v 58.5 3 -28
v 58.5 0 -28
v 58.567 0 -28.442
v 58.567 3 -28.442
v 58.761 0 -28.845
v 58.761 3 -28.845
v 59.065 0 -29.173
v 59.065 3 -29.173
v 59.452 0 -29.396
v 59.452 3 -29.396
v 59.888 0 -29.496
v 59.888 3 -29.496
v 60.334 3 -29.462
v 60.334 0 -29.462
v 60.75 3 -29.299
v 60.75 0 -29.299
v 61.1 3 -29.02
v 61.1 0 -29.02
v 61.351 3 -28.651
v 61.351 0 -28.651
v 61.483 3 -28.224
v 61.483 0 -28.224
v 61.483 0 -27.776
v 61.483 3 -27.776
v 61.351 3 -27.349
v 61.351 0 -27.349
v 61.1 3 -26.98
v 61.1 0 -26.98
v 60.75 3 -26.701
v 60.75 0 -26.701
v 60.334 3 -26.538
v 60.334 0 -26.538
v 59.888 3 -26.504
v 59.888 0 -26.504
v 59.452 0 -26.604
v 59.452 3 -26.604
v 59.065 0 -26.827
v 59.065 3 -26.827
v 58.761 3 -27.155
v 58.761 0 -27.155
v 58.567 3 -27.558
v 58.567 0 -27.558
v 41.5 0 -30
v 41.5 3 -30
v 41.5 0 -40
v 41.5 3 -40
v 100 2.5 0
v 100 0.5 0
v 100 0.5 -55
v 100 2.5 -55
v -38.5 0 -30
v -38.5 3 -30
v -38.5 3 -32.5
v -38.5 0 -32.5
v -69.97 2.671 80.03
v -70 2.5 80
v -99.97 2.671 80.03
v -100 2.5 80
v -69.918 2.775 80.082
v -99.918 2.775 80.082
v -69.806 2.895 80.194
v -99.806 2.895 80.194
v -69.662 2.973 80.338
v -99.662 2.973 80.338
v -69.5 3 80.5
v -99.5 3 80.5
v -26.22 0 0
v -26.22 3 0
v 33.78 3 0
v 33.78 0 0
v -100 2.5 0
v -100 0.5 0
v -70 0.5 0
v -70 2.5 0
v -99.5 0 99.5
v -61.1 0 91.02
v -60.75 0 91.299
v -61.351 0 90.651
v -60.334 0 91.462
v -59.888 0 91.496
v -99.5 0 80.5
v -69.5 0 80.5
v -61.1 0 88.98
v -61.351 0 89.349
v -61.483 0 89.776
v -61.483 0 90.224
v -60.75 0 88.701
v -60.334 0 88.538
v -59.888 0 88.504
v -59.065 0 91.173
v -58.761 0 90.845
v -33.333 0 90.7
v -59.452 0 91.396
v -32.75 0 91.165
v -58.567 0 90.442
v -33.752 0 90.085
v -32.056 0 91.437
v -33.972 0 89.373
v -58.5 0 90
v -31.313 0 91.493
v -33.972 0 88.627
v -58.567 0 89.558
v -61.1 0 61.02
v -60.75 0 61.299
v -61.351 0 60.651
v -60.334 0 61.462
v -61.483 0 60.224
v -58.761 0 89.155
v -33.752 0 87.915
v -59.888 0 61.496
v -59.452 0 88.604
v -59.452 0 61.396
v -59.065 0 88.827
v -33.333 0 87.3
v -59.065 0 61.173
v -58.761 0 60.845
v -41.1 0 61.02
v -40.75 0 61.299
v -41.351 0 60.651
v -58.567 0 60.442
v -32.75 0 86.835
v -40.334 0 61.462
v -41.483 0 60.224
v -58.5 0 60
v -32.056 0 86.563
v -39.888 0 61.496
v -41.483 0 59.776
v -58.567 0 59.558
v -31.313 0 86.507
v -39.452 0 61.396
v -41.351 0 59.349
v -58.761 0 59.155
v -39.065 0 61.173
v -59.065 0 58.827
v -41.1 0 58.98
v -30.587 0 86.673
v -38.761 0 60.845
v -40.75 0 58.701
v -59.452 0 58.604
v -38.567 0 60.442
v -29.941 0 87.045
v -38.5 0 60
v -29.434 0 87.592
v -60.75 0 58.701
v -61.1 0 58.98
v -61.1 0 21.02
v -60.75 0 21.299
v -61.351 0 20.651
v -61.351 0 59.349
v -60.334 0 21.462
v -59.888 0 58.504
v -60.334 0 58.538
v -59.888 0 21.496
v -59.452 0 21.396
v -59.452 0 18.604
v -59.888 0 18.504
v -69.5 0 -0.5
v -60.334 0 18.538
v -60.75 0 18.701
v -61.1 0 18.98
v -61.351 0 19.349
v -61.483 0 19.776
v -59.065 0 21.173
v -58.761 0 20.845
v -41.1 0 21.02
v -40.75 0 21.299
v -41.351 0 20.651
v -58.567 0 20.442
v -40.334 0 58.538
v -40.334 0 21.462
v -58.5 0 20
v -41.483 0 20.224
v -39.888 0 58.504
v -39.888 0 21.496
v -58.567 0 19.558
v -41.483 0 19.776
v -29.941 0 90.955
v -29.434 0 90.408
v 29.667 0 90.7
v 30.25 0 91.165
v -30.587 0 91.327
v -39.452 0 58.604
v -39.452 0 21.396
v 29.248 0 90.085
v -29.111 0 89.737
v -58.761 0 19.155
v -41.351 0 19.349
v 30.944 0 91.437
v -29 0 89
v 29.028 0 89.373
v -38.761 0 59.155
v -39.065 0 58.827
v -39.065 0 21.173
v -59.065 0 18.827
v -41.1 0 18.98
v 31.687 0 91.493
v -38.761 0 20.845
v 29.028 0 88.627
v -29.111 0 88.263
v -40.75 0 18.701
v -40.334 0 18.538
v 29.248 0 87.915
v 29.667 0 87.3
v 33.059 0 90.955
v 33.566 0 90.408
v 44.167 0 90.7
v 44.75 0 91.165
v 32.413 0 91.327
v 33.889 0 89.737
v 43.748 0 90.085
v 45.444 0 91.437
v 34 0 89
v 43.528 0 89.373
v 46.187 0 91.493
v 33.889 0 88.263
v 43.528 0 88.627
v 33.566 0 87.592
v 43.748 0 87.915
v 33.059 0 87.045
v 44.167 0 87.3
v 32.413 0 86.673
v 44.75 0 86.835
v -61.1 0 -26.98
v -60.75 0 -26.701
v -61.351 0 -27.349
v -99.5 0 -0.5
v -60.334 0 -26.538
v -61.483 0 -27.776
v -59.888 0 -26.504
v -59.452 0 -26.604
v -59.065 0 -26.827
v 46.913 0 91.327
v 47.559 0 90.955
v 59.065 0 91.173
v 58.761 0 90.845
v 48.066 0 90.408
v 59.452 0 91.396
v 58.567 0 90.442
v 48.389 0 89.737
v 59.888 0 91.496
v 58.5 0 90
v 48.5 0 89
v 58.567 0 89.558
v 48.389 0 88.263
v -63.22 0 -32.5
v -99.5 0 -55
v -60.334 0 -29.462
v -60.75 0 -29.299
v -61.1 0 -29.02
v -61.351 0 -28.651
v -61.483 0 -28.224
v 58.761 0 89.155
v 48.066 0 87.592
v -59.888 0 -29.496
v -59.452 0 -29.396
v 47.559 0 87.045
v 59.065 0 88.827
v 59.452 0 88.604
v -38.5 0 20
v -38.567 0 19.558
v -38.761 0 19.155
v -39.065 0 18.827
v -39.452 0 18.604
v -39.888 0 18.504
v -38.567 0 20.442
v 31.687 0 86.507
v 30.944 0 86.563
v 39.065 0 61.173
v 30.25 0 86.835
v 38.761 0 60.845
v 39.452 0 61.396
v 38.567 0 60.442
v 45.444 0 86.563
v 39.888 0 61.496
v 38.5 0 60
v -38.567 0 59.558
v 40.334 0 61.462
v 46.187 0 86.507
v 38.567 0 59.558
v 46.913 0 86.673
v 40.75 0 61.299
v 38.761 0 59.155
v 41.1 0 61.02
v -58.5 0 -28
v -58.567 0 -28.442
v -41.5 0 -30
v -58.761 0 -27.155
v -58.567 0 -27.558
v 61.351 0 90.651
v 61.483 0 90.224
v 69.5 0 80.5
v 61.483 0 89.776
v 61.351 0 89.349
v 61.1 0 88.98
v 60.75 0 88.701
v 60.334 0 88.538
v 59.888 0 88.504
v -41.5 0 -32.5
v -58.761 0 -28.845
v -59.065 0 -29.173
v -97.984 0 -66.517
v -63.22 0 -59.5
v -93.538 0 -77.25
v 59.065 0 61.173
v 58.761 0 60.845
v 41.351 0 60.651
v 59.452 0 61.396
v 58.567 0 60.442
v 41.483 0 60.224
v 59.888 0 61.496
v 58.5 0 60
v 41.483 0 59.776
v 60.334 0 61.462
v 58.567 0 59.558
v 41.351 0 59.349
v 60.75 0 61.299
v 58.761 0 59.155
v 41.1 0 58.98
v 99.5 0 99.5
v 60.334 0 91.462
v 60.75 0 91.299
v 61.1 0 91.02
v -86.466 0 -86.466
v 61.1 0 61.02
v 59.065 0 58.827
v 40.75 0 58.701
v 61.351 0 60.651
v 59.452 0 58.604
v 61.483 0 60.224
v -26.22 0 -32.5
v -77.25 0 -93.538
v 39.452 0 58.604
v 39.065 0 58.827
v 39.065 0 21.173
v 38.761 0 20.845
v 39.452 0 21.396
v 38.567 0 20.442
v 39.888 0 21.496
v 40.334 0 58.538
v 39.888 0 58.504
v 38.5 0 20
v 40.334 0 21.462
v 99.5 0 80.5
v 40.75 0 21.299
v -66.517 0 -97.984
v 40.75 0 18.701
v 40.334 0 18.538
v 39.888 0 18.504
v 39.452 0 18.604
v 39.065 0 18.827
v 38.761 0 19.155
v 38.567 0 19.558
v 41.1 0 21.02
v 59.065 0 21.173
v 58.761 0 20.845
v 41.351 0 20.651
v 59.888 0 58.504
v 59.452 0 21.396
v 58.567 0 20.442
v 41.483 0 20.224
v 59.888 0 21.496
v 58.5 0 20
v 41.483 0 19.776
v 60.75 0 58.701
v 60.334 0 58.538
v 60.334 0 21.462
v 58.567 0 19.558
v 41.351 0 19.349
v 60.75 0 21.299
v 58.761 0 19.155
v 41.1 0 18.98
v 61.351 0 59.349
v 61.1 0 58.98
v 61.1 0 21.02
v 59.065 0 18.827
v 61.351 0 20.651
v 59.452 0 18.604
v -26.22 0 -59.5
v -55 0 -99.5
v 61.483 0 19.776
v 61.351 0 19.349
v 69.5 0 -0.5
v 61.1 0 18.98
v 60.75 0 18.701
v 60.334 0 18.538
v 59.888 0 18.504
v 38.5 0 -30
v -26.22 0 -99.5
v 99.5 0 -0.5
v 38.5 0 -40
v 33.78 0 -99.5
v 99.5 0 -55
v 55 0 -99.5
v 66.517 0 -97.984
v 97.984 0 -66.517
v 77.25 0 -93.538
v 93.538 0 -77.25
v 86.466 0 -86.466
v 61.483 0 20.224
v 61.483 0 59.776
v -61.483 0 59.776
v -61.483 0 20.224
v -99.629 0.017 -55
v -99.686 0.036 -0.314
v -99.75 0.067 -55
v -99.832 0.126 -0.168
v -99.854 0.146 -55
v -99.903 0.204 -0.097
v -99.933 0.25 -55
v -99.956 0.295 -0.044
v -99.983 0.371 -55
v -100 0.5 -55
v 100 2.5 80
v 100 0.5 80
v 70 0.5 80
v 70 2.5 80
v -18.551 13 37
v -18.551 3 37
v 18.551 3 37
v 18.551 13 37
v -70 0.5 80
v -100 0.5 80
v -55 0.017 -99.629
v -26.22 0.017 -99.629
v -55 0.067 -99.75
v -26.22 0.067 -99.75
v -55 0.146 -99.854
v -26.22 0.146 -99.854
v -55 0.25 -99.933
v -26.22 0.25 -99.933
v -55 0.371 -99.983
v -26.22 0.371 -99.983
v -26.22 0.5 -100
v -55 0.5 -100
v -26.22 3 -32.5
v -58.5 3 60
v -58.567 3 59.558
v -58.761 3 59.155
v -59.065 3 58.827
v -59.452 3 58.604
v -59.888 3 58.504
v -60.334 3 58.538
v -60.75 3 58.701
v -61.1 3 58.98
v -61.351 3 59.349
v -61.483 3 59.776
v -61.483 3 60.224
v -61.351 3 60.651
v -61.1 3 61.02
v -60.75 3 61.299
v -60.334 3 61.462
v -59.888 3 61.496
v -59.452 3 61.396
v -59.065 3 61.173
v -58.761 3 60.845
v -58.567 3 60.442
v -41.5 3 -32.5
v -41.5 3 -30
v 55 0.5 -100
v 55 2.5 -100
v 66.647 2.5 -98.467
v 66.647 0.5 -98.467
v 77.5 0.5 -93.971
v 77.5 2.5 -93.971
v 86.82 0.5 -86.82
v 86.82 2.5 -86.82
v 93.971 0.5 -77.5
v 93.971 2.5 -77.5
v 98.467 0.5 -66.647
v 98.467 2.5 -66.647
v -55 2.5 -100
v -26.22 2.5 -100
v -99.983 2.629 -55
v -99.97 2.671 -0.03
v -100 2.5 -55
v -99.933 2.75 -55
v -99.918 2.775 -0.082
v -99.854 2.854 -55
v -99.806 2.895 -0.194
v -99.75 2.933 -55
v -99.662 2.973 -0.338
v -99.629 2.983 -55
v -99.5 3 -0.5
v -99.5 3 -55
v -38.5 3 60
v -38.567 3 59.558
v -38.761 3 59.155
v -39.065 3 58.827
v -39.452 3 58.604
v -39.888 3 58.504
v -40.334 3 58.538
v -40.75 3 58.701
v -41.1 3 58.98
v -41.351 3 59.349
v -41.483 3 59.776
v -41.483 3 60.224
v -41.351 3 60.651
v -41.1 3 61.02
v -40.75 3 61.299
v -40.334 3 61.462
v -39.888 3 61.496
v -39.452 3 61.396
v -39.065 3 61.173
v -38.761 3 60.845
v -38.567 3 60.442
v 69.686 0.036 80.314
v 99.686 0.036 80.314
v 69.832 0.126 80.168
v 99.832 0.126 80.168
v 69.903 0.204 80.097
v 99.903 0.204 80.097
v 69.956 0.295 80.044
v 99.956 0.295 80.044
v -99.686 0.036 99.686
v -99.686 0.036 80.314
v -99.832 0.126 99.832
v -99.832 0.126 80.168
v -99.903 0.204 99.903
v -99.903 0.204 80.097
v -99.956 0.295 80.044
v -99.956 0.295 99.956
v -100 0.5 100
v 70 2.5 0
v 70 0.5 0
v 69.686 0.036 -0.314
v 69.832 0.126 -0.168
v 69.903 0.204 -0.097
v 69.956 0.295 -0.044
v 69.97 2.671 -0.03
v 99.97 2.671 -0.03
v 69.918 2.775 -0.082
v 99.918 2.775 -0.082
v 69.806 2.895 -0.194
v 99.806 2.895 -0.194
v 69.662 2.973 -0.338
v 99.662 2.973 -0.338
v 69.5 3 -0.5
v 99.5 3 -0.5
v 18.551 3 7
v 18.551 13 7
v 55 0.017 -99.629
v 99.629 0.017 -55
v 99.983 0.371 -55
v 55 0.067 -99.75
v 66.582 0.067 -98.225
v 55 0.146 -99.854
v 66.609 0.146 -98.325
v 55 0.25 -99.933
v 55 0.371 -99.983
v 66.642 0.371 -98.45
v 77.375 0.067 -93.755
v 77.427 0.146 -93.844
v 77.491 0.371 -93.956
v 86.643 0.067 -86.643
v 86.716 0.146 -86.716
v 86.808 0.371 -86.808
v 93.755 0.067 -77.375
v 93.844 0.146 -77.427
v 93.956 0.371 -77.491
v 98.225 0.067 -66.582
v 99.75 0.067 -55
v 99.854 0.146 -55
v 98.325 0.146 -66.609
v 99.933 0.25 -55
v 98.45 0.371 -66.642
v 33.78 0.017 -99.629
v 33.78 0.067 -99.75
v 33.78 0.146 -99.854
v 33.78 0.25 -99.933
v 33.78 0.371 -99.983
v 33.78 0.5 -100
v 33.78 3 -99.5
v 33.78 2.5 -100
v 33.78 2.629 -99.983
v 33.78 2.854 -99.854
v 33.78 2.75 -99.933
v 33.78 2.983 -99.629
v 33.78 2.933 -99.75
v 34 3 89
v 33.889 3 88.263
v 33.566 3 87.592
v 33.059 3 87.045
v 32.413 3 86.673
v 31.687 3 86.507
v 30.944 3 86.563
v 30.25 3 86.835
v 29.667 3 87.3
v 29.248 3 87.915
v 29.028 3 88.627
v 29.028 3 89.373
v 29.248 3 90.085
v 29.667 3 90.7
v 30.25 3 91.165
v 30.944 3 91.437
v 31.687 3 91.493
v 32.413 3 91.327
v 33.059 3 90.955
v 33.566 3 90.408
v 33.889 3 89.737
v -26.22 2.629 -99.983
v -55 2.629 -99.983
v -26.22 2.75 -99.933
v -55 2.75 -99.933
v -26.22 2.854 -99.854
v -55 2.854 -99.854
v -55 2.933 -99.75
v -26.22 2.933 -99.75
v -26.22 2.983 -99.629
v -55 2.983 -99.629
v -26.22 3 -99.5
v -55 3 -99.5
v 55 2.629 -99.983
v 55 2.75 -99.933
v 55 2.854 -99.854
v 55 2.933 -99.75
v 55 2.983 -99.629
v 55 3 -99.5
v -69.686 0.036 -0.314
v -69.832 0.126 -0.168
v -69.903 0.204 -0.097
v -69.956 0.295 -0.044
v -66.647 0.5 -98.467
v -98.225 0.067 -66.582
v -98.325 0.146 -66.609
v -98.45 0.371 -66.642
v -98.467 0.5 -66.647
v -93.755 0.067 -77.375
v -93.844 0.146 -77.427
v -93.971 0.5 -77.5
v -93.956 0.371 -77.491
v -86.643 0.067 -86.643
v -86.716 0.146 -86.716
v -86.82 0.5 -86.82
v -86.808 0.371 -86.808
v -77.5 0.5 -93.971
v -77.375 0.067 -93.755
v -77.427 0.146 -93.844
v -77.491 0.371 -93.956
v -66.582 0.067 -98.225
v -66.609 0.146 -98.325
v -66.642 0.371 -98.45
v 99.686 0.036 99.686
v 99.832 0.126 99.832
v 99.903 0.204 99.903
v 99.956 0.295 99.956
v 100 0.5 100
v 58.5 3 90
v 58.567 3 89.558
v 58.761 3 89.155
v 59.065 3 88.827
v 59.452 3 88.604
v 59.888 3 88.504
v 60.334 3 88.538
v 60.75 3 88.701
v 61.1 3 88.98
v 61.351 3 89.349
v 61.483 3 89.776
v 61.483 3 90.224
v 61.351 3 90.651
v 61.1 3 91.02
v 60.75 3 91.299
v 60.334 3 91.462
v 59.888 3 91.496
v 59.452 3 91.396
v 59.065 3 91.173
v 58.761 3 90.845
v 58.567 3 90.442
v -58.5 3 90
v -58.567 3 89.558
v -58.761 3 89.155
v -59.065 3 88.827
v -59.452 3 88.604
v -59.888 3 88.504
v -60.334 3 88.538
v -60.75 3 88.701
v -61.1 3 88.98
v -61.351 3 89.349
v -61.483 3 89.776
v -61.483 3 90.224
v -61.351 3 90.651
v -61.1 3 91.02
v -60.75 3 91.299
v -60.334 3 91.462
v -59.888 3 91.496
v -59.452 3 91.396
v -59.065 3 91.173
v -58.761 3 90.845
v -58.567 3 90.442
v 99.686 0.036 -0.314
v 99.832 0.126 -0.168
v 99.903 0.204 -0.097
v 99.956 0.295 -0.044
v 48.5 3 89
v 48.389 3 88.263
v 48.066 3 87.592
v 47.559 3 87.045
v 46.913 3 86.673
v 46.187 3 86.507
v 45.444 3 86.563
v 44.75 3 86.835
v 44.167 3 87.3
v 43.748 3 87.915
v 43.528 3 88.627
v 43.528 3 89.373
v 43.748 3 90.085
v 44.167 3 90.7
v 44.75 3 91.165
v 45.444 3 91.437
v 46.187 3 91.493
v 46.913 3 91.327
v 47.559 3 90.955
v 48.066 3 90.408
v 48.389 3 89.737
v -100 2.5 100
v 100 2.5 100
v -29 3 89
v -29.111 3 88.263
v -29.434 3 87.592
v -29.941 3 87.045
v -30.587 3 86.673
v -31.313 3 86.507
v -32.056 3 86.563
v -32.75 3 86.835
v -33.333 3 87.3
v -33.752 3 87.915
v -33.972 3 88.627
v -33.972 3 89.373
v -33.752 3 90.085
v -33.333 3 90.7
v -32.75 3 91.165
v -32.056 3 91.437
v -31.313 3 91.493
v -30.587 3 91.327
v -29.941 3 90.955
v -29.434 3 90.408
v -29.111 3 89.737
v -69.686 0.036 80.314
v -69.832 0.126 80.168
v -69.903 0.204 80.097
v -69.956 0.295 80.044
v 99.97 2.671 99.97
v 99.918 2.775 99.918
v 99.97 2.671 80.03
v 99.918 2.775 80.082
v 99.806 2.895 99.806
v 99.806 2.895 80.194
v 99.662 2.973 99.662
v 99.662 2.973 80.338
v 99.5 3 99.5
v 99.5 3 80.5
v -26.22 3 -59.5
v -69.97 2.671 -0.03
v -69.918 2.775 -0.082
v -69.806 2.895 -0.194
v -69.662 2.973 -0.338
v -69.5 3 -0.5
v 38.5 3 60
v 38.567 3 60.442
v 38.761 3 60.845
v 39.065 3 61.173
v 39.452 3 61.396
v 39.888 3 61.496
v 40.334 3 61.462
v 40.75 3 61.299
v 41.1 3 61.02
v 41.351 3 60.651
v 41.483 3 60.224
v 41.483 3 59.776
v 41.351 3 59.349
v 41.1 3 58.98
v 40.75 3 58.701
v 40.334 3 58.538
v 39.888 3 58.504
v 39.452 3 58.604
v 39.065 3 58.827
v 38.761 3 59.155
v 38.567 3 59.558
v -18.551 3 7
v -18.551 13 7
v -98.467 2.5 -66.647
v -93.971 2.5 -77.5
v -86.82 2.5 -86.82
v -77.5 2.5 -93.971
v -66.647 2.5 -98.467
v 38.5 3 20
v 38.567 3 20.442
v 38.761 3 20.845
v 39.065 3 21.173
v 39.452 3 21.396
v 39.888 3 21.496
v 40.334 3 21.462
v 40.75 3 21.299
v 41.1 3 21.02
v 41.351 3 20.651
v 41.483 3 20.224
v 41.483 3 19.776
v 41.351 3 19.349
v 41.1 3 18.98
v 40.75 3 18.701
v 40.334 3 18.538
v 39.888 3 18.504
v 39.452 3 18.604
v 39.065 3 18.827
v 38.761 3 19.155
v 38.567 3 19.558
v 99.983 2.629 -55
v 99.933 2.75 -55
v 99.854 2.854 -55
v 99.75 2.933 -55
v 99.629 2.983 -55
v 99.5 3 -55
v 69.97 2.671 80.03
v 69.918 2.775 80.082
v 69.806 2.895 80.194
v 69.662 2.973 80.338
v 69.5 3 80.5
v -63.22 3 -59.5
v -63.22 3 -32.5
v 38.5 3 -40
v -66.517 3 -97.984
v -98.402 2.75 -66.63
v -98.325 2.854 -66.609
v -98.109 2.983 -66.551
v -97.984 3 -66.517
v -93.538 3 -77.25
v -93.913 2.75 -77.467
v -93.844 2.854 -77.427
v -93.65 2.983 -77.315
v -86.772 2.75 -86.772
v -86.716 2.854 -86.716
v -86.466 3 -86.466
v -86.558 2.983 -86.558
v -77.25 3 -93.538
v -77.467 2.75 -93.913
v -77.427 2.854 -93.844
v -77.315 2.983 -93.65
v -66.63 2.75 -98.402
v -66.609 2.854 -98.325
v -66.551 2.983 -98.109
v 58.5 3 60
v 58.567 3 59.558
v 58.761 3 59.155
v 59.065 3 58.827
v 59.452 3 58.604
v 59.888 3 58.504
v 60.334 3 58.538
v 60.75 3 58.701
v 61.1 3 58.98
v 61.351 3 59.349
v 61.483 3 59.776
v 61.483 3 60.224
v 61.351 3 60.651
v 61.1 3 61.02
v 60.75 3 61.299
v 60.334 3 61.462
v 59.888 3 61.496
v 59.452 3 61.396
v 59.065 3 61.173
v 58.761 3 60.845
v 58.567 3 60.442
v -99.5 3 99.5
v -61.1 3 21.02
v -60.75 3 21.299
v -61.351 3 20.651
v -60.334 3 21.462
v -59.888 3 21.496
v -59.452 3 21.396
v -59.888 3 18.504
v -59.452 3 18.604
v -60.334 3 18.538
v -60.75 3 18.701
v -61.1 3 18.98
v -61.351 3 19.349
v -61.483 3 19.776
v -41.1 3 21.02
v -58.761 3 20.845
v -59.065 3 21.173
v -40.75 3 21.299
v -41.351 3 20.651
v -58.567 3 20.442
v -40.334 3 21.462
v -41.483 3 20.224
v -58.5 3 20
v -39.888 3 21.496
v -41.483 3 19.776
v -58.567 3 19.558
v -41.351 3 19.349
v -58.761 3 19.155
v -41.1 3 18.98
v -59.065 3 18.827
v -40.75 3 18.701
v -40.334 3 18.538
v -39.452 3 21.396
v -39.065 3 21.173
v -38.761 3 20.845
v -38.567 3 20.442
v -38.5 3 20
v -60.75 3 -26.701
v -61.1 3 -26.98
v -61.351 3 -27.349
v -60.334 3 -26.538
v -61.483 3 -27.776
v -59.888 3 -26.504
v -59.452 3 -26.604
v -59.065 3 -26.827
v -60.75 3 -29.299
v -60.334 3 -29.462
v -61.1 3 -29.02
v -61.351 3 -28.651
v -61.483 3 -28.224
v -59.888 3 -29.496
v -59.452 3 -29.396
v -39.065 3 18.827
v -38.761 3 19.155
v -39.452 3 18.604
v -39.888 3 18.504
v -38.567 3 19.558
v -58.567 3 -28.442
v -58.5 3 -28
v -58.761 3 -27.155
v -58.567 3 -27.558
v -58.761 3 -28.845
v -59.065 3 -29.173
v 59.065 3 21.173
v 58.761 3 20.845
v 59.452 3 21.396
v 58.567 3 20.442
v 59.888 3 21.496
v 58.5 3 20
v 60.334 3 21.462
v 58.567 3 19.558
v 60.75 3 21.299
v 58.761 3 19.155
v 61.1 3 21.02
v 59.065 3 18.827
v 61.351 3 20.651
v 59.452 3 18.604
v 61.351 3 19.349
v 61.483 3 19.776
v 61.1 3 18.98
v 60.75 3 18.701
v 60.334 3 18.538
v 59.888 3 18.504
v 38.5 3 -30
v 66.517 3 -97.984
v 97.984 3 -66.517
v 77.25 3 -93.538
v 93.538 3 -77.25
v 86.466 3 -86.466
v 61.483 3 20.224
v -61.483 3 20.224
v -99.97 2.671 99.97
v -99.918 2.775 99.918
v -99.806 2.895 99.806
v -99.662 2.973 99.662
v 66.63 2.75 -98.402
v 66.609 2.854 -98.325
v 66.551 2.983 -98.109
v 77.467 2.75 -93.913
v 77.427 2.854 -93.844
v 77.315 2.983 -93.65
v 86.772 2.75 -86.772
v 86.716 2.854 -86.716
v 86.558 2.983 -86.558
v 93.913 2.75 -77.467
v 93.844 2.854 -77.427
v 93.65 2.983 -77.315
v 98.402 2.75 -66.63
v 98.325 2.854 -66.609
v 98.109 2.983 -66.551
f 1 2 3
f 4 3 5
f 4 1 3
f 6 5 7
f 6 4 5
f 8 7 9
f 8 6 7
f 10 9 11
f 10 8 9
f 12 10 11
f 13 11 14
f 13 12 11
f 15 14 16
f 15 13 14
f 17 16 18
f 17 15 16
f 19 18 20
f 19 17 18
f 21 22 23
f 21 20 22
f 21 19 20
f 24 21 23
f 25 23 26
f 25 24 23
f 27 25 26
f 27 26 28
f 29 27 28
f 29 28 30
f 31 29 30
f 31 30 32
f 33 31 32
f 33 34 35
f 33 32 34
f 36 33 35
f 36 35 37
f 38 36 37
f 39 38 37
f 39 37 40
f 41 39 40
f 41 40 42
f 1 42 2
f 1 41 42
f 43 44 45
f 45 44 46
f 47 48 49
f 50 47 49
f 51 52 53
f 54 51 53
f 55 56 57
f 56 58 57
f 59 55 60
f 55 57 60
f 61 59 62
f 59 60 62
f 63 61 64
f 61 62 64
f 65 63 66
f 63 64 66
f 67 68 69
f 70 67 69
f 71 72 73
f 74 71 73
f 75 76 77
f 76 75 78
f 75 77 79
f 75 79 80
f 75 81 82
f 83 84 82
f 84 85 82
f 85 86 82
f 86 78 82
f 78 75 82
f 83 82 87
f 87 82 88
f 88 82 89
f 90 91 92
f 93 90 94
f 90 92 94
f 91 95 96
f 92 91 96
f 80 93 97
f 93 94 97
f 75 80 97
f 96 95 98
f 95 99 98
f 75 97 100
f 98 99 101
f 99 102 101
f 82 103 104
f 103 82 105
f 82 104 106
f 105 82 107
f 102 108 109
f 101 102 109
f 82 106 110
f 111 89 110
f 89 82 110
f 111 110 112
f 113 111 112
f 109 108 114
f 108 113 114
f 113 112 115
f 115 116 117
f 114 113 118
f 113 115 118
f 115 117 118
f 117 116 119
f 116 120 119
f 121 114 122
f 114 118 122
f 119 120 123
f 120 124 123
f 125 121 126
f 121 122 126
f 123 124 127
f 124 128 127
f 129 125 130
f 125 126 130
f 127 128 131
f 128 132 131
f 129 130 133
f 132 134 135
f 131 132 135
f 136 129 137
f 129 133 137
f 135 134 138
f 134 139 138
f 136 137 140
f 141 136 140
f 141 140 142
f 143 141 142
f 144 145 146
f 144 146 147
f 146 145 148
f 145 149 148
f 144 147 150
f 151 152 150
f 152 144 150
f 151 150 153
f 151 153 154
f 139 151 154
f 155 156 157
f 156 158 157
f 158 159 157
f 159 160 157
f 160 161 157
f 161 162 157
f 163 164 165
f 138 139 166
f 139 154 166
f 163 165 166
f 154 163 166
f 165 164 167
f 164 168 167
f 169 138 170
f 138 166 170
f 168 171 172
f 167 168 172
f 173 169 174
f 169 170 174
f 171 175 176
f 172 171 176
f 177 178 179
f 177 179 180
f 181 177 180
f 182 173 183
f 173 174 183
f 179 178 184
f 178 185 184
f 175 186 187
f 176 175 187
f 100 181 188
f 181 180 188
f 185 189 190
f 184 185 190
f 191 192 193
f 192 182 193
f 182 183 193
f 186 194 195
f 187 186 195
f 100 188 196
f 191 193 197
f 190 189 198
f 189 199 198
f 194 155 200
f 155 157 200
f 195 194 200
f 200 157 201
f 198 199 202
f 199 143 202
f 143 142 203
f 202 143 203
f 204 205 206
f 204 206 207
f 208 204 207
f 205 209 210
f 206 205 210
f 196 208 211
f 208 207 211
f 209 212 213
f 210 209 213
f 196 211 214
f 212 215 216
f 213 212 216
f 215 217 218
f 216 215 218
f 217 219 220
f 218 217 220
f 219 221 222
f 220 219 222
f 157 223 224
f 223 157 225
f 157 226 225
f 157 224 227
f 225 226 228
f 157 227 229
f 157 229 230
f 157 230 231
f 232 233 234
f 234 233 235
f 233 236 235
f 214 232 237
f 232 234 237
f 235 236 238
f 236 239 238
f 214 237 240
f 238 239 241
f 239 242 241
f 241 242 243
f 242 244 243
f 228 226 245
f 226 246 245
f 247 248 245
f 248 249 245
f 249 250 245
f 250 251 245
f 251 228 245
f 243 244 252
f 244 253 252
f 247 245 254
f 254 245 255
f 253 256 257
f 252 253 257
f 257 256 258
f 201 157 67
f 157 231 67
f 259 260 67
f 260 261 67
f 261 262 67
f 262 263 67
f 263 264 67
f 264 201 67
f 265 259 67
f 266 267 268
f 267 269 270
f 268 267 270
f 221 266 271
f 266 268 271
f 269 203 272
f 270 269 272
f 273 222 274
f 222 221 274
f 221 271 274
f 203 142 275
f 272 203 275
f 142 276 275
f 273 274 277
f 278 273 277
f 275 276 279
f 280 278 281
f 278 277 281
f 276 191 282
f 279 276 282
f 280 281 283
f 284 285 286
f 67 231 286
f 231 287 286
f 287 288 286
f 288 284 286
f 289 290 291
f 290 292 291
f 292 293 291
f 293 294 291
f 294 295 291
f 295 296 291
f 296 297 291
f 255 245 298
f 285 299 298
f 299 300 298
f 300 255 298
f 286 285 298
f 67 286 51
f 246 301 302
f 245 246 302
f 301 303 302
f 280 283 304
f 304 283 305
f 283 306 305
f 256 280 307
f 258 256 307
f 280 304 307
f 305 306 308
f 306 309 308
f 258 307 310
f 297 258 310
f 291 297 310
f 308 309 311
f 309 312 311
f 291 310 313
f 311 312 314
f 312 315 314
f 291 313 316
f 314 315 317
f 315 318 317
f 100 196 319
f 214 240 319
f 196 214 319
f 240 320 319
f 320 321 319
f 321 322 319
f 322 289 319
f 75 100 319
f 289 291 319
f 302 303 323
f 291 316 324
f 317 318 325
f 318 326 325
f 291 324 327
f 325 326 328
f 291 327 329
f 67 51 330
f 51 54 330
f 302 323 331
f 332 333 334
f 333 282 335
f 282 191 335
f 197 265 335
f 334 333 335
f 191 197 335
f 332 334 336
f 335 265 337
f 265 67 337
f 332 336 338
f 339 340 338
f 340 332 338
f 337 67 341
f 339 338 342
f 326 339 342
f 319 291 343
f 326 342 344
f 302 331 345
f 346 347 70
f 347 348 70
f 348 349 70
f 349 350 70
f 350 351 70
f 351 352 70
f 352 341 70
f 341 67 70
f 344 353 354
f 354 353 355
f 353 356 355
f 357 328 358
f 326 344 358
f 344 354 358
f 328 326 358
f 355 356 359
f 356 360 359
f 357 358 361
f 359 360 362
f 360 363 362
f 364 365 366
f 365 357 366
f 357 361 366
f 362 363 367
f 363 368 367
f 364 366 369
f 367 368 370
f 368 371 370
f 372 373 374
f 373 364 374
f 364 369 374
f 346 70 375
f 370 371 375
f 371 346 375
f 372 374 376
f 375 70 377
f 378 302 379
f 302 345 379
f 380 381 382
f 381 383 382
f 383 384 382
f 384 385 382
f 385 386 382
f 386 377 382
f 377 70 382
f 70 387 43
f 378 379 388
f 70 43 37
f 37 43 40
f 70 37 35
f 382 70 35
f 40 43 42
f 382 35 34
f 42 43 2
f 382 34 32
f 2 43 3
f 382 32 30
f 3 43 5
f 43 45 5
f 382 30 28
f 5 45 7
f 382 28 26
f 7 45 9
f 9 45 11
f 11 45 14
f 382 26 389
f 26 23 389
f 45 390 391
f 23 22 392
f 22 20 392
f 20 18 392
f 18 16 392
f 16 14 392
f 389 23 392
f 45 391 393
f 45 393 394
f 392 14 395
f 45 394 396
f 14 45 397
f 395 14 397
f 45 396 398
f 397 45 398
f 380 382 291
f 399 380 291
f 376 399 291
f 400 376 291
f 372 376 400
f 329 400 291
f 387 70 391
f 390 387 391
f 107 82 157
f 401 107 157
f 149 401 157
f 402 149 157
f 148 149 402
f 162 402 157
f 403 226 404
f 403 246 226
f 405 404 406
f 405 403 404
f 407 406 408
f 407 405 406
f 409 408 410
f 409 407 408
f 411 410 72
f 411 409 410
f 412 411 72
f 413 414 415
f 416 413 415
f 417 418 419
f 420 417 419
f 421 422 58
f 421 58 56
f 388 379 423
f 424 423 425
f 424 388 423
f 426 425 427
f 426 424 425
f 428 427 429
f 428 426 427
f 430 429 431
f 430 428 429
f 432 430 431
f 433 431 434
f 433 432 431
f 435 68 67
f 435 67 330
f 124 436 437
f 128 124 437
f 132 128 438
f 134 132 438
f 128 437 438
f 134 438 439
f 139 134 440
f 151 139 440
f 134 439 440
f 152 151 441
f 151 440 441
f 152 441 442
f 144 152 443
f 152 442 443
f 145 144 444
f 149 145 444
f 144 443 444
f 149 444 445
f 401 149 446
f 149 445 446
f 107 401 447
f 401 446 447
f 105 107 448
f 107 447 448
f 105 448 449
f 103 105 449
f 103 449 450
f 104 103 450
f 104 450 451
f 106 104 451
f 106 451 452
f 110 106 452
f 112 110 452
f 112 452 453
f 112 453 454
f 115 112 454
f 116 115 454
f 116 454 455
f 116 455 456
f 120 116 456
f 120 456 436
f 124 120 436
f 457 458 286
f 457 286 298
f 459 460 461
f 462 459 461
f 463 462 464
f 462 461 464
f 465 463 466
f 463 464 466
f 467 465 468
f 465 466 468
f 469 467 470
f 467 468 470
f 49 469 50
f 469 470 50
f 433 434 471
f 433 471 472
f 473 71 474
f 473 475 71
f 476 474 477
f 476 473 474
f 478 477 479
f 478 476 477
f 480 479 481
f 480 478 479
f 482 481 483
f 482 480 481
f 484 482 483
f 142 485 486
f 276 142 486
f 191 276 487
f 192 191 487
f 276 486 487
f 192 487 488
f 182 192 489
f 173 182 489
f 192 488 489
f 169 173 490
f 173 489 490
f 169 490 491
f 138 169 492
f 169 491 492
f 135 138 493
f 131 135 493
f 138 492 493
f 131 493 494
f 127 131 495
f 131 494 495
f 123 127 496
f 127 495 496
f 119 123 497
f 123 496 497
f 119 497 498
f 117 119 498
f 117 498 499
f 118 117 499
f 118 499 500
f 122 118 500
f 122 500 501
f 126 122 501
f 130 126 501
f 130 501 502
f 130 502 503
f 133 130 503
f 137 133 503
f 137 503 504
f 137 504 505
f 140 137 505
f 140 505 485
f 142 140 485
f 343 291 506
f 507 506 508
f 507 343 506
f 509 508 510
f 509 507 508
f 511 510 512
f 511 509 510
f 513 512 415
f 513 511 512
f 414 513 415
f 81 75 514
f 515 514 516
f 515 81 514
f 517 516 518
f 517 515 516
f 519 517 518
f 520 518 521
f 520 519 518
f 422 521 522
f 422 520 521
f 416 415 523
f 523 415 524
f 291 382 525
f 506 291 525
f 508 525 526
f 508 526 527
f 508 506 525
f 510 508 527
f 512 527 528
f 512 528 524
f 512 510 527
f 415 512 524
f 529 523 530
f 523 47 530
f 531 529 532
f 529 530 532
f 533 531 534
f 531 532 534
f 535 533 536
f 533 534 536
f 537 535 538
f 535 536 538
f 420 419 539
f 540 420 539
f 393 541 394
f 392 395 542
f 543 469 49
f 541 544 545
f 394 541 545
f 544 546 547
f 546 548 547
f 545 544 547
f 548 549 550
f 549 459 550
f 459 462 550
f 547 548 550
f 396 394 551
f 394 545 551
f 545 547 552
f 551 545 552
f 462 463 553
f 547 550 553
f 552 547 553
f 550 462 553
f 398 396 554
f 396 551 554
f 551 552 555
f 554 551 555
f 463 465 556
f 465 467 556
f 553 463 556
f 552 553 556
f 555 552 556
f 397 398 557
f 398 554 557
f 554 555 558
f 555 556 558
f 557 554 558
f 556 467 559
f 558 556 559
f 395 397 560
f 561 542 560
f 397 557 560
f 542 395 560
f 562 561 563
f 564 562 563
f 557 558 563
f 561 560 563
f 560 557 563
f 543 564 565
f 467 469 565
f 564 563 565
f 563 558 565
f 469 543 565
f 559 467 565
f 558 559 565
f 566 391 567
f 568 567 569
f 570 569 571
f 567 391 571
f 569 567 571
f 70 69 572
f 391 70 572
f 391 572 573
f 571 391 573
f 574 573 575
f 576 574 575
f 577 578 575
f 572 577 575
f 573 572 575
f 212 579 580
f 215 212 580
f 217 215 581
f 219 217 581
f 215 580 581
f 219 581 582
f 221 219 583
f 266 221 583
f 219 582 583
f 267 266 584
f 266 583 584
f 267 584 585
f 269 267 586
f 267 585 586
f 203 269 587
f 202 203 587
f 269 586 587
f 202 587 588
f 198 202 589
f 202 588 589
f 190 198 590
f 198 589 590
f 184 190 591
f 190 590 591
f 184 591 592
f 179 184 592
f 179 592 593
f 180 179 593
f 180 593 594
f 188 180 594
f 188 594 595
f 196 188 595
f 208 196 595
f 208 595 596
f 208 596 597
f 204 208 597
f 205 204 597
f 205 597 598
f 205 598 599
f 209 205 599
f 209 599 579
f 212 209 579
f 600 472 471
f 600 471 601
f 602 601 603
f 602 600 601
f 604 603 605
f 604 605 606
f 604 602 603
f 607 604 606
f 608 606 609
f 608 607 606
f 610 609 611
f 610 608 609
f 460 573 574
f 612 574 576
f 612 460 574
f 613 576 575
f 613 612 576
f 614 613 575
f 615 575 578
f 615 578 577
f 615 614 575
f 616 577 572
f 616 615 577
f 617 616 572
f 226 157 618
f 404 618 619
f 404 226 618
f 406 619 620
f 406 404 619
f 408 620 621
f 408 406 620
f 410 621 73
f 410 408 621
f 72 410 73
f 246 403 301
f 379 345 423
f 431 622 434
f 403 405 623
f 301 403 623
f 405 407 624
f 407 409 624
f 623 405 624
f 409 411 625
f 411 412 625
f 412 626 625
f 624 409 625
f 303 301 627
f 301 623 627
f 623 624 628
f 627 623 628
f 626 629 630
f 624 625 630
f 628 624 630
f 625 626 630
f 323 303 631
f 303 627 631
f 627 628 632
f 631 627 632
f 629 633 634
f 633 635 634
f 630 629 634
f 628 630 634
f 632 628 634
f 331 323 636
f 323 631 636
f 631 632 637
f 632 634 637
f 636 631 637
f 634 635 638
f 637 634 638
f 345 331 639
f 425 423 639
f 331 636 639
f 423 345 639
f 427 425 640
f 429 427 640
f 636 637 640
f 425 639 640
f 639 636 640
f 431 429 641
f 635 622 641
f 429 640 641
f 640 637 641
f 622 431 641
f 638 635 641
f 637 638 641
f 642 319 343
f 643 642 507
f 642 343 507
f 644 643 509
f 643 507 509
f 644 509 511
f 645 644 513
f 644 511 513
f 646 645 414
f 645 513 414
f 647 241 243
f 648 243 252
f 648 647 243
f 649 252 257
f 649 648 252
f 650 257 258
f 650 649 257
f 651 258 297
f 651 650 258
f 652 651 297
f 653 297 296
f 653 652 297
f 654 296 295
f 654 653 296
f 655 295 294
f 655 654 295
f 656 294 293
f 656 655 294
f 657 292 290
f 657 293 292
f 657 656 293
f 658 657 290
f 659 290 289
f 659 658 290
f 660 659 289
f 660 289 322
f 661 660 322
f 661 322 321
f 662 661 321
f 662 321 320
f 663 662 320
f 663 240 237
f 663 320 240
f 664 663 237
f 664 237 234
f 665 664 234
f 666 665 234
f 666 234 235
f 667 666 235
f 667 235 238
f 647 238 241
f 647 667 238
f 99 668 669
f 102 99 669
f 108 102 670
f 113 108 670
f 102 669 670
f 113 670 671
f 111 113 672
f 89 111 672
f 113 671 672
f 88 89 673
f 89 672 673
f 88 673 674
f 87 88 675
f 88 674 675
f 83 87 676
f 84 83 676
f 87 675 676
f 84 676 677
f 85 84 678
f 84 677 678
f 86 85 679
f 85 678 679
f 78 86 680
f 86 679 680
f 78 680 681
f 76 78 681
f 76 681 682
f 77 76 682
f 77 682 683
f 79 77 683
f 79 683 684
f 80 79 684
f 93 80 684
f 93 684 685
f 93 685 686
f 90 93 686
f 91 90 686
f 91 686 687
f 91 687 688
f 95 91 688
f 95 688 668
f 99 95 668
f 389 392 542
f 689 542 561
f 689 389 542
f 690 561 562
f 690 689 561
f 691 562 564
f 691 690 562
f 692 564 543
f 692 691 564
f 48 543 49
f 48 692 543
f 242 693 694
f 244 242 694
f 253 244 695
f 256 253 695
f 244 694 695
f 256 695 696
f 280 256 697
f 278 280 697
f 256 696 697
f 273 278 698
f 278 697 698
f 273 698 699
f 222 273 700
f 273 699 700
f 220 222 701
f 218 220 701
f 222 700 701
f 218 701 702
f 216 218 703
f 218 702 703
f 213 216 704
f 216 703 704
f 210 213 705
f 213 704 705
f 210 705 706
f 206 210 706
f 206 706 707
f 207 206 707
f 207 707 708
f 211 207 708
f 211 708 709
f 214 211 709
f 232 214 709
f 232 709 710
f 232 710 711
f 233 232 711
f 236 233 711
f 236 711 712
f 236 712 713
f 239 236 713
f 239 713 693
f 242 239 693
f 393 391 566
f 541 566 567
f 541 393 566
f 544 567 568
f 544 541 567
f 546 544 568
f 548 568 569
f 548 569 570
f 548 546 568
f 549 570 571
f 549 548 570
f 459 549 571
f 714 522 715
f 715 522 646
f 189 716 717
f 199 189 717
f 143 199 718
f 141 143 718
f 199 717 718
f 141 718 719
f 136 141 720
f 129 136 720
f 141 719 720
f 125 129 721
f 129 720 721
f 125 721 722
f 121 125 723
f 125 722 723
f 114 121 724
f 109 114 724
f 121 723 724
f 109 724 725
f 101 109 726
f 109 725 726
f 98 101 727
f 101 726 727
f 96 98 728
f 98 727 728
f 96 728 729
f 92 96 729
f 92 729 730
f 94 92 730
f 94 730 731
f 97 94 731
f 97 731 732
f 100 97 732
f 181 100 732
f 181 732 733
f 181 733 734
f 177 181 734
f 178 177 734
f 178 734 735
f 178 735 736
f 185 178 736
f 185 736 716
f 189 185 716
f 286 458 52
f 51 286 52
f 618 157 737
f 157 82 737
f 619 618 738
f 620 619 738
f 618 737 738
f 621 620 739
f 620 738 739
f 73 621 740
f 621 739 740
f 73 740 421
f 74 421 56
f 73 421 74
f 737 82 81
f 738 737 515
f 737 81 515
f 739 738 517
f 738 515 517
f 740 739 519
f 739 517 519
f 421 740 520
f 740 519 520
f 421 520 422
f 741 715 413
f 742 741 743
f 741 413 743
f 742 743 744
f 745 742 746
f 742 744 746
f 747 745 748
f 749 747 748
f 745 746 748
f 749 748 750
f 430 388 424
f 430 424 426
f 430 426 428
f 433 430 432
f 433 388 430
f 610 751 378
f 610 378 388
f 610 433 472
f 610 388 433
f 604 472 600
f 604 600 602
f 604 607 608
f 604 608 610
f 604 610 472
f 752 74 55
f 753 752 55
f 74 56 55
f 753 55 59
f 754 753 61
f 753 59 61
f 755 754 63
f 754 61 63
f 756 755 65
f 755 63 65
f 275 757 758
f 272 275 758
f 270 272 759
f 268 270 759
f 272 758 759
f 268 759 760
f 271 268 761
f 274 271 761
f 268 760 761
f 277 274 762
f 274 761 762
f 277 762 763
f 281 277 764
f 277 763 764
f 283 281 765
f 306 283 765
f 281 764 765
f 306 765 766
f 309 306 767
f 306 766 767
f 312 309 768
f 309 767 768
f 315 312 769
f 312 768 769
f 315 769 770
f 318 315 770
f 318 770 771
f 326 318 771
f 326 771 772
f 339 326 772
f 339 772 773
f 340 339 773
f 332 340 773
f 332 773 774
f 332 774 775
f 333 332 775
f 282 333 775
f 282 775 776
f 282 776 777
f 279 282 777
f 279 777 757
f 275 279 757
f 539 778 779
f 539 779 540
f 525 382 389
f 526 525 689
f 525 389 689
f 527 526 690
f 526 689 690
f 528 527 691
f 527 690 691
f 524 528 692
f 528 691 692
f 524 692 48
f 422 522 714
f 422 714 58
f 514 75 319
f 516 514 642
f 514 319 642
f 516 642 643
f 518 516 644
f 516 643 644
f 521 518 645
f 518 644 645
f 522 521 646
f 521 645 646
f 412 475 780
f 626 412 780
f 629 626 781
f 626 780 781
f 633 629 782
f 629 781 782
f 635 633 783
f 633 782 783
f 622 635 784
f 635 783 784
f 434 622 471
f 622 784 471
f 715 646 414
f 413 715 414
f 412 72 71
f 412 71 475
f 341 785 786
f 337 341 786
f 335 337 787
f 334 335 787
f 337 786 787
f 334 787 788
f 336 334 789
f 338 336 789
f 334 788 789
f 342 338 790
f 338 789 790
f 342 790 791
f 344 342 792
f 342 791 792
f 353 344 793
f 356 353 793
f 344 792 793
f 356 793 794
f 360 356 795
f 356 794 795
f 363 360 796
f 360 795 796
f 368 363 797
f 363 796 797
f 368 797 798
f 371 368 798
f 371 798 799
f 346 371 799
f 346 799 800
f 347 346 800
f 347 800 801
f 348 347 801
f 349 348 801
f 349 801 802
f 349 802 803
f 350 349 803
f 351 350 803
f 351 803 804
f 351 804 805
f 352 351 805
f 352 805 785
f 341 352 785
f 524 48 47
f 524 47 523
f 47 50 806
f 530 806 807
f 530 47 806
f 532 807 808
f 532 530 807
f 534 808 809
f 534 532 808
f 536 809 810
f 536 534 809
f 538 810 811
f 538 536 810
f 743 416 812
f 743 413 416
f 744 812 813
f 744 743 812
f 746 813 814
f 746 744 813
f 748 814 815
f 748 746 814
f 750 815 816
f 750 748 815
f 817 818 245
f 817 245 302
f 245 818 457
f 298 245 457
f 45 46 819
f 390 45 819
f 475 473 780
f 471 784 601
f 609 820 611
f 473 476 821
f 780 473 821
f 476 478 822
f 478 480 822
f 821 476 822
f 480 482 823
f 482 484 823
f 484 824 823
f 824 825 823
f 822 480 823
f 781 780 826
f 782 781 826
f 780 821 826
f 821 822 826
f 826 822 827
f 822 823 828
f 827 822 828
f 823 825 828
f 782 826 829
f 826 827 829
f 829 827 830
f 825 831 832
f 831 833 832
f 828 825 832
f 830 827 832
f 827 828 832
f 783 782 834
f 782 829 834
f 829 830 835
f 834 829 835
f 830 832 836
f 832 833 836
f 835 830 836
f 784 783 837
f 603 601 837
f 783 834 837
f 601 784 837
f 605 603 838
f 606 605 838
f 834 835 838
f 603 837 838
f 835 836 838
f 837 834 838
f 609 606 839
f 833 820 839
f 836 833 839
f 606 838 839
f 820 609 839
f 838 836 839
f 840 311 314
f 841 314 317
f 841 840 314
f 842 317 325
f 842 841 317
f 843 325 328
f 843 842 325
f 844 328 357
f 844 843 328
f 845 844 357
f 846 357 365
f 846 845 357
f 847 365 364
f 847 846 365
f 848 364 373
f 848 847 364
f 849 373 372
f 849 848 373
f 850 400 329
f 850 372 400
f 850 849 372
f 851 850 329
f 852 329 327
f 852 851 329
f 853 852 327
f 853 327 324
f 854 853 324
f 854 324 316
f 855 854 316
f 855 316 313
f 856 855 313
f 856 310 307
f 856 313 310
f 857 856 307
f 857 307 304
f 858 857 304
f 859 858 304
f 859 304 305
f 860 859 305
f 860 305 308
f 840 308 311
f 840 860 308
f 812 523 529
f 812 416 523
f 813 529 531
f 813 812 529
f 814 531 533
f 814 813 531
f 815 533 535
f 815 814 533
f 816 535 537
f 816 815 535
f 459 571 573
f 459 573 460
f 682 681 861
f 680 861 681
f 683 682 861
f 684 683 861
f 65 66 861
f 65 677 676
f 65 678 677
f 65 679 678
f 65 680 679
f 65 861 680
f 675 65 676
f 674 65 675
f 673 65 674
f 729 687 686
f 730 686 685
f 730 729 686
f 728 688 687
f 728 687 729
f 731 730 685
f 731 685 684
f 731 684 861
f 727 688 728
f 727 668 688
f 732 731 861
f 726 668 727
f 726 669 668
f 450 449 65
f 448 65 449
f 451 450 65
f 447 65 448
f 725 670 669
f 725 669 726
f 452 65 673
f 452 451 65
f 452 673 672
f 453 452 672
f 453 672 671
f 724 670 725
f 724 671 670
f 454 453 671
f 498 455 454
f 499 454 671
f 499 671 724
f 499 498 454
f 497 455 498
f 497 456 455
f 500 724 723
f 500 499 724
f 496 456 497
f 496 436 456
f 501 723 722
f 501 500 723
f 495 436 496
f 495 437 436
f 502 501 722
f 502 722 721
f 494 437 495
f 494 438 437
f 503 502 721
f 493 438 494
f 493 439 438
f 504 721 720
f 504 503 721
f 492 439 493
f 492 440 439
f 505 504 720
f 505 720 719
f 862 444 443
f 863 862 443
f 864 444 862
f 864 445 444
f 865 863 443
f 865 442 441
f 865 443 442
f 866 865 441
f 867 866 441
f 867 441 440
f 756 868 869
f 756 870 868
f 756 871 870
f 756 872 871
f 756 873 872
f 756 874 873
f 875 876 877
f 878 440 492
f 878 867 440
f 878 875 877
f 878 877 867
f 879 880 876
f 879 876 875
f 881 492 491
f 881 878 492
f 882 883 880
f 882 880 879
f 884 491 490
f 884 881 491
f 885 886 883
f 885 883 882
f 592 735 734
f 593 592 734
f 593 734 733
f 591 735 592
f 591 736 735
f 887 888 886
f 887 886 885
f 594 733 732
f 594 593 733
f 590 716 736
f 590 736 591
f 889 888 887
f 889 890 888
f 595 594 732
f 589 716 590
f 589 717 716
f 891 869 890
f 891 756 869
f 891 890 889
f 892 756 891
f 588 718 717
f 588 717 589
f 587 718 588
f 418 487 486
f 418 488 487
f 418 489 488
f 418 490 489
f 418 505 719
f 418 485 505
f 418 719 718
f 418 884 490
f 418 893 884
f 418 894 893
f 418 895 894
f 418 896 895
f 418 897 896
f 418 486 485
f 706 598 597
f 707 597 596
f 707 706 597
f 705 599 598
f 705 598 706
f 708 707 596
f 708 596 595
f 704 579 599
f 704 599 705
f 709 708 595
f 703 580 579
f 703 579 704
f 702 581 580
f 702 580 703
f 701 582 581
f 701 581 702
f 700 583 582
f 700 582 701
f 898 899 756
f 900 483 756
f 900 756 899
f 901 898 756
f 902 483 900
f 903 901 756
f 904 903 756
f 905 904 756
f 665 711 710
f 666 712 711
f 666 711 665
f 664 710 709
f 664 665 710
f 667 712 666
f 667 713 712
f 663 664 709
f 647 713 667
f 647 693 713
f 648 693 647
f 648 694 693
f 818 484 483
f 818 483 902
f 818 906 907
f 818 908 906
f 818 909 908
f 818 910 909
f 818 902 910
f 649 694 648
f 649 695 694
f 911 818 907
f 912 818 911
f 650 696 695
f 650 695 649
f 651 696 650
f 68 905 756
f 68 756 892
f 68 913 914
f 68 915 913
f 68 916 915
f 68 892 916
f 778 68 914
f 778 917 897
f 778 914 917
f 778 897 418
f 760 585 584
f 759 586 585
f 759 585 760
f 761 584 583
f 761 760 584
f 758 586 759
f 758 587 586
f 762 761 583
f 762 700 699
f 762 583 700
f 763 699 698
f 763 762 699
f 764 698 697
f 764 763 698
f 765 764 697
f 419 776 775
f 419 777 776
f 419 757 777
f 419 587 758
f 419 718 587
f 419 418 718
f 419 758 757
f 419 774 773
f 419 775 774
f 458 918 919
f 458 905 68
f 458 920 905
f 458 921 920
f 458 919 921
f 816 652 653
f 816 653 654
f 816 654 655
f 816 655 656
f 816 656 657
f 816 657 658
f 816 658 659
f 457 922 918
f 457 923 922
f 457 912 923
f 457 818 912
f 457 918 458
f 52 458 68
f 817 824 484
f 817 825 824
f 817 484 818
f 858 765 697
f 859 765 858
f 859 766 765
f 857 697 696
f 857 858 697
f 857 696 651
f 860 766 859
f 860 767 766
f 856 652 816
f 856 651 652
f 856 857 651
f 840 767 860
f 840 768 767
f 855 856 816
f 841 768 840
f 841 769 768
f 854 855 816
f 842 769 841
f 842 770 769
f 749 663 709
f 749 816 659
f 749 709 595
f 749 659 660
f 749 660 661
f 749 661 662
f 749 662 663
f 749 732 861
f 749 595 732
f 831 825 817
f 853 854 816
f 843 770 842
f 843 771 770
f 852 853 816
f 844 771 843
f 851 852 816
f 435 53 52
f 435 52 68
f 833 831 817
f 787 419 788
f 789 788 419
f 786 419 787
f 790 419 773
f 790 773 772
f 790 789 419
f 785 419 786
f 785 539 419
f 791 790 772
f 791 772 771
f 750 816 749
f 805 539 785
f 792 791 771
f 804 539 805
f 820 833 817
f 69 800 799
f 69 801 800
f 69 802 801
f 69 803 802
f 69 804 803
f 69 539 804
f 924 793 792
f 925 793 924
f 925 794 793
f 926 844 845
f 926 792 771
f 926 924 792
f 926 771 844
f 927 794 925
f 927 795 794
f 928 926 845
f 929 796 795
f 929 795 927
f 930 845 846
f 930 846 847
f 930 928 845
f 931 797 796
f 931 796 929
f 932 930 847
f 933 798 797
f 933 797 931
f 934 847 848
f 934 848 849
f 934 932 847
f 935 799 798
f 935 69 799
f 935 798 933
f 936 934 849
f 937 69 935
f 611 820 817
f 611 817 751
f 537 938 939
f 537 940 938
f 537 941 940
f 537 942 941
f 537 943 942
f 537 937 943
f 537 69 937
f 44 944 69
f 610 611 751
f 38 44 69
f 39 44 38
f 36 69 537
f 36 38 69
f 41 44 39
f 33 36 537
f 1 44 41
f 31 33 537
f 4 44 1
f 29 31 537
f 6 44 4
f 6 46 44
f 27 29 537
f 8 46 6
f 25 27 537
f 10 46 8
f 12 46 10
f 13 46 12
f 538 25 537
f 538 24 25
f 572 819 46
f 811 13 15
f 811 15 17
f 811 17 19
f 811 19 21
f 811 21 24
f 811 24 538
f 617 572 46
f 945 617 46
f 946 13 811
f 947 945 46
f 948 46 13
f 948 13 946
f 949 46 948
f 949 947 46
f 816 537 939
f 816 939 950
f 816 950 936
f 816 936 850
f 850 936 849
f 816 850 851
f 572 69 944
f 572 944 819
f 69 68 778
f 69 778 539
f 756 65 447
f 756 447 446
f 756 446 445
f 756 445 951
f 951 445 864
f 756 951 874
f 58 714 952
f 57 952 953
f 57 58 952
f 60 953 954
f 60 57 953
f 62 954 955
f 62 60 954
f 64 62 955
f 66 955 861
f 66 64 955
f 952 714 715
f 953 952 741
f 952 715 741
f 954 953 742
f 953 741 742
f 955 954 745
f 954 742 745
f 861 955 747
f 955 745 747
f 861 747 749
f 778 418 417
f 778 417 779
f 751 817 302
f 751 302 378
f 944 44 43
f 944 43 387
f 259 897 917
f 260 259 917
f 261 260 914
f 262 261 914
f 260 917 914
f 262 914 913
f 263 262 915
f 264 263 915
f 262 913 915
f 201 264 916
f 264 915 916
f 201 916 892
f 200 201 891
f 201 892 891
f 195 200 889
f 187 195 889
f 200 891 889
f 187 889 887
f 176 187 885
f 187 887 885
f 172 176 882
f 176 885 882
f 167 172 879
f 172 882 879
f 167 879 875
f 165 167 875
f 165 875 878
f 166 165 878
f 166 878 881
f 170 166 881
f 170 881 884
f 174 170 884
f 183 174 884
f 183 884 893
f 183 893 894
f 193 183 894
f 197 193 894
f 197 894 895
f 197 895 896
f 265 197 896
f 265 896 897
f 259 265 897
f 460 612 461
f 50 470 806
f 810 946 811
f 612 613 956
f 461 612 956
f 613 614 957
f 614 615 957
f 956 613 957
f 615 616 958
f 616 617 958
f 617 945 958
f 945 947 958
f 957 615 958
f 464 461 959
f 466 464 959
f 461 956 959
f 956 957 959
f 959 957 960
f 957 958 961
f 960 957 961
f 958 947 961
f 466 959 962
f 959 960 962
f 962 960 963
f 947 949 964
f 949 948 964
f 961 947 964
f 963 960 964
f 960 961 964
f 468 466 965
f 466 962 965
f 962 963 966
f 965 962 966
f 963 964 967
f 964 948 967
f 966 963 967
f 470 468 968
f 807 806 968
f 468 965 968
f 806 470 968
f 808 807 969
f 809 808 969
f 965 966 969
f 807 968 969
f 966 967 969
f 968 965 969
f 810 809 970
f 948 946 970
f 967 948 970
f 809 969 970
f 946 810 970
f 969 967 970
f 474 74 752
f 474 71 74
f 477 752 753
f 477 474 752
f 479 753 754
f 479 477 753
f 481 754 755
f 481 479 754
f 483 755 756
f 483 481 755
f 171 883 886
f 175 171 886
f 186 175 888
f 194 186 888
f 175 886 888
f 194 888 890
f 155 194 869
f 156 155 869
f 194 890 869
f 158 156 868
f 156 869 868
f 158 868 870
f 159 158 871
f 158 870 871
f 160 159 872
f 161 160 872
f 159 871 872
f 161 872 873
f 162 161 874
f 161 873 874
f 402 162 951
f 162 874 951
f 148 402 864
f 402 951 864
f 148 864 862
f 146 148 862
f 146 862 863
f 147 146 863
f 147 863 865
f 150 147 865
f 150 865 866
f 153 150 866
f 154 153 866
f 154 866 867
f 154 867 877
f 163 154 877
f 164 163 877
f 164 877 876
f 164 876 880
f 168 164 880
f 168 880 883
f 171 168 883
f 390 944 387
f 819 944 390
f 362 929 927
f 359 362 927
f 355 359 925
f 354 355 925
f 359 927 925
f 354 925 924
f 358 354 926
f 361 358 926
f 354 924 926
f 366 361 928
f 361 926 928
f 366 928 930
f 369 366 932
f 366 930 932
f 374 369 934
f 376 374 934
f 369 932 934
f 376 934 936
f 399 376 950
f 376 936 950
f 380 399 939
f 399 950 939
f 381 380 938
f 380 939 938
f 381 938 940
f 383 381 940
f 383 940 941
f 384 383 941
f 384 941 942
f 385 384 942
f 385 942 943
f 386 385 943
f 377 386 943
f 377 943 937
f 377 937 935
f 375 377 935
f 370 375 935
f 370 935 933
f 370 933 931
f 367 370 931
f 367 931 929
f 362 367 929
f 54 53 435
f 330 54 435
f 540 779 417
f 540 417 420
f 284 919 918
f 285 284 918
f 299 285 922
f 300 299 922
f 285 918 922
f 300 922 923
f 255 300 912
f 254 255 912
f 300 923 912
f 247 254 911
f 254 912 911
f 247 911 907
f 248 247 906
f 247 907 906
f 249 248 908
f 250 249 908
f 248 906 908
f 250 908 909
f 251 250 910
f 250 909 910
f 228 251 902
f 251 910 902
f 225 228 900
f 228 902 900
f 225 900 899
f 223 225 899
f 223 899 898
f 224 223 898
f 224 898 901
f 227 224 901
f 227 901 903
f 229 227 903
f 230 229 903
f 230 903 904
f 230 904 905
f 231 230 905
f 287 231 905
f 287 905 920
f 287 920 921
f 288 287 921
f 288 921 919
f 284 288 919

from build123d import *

# Parameters (mm, degrees)
SKETCH1_W               = 200
SKETCH1_H               = 200
BOSS_EXTRUDE1_DEPTH     = 3
CUT_EXTRUDE1_START      = -4
SKETCH2_W               = 30
SKETCH2_H               = 80
CUT_EXTRUDE1_DEPTH      = 14
FILLET1_R               = 45
SKETCH10_R              = 1.5
CUT_EXTRUDE9_DEPTH      = 4
LPATTERN1_COUNT         = 2
LPATTERN1_PITCH         = 40
LPATTERN1_COUNT_DIR2    = 2
LPATTERN1_PITCH_DIR2    = 20
SKETCH13_R              = 1.5
SKETCH13_W              = 3
SKETCH13_H              = 10
CUT_EXTRUDE10_DEPTH     = 4
SKETCH14_R              = 1.5
CUT_EXTRUDE11_DEPTH     = 4
MIRROR1_COPY_1_SKETCH_R = 1.5
MIRROR1_COPY_1_DEPTH    = 4
MIRROR1_COPY_2_SKETCH_R = 1.5
MIRROR1_COPY_2_DEPTH    = 4
MIRROR1_COPY_3_SKETCH_R = 1.5
MIRROR1_COPY_3_DEPTH    = 4
FILLET2_R               = 0.5
SKETCH23_W              = 60
SKETCH23_H              = 70
CUT_EXTRUDE13_DEPTH     = 10
SKETCH25_W              = 60
SKETCH25_H              = 33
CUT_EXTRUDE15_DEPTH     = 10
SKETCH26_W              = 37.10221973
SKETCH26_H              = 30
BOSS_EXTRUDE3_DEPTH     = 10
SKETCH27_W              = 37
SKETCH27_H              = 27
CUT_EXTRUDE16_DEPTH     = 10
SKETCH30_R              = 2.5
CUT_EXTRUDE17_DEPTH     = 10
SKETCH31_R              = 2.5
CUT_EXTRUDE18_DEPTH     = 10


with BuildPart() as part:
    # Sketch1 → Boss-Extrude1 (new body)
    with BuildSketch(Plane(origin=(0, 0, 0), x_dir=(1, 0, 0), z_dir=(0, 1, 0))):
        Rectangle(SKETCH1_W, SKETCH1_H)
    extrude(amount=BOSS_EXTRUDE1_DEPTH)

    # Sketch2 → Cut-Extrude1 (cut)
    with BuildSketch(Plane(origin=(0, 3, 0), x_dir=(1, 0, 0), z_dir=(0, 1, 0)).offset(CUT_EXTRUDE1_START)):
        with Locations((-85, -40)):
            Rectangle(SKETCH2_W, SKETCH2_H)
    cut_extrude1 = extrude(amount=CUT_EXTRUDE1_DEPTH, mode=Mode.SUBTRACT)

    # Fillet1
    fillet1_edges = [part.edges().sort_by_distance(p)[0] for p in [
        (-100, 1.5, -100),
        (100, 1.5, -100),
    ]]
    fillet(fillet1_edges, radius=FILLET1_R)

    # Sketch10 → Cut-Extrude9 (cut, through all)
    with BuildSketch(Plane(origin=(0, 3, 0), x_dir=(1, 0, 0), z_dir=(0, 1, 0))):
        with Locations((-60, -60)):
            Circle(SKETCH10_R)
    cut_extrude9 = extrude(amount=-CUT_EXTRUDE9_DEPTH, mode=Mode.SUBTRACT)

    # LPattern1: Cut-Extrude9 2 × 2
    with Locations(*[(j * LPATTERN1_PITCH_DIR2, 0, -i * LPATTERN1_PITCH) for i in range(LPATTERN1_COUNT) for j in range(LPATTERN1_COUNT_DIR2) if (i, j) != (0, 0)]):
        add(cut_extrude9, mode=Mode.SUBTRACT)

    # Sketch13 → Cut-Extrude10 (cut, through all)
    with BuildSketch(Plane(origin=(0, 3, 0), x_dir=(1, 0, 0), z_dir=(0, 1, 0))):
        with Locations((-60, 28)):
            Circle(SKETCH13_R)
        with Locations((-40, 35)):
            Rectangle(SKETCH13_W, SKETCH13_H)
    cut_extrude10 = extrude(amount=-CUT_EXTRUDE10_DEPTH, mode=Mode.SUBTRACT)

    # Sketch14 → Cut-Extrude11 (cut, through all)
    with BuildSketch(Plane(origin=(0, 3, 0), x_dir=(1, 0, 0), z_dir=(0, 1, 0))):
        with Locations((-60, -90)):
            Circle(SKETCH14_R)
    cut_extrude11 = extrude(amount=-CUT_EXTRUDE11_DEPTH, mode=Mode.SUBTRACT)

    # Mirror1: Cut-Extrude10, Cut-Extrude9, Cut-Extrude1, Cut-Extrude11 across plane
    add(cut_extrude10.mirror(Plane(origin=(0, 0, 0), x_dir=(0, 0, 1), z_dir=(1, 0, 0))), mode=Mode.SUBTRACT)
    add(cut_extrude9.mirror(Plane(origin=(0, 0, 0), x_dir=(0, 0, 1), z_dir=(1, 0, 0))), mode=Mode.SUBTRACT)
    add(cut_extrude1.mirror(Plane(origin=(0, 0, 0), x_dir=(0, 0, 1), z_dir=(1, 0, 0))), mode=Mode.SUBTRACT)
    add(cut_extrude11.mirror(Plane(origin=(0, 0, 0), x_dir=(0, 0, 1), z_dir=(1, 0, 0))), mode=Mode.SUBTRACT)

    # Mirror1 copy 1 sketch → Mirror1 copy 1 (cut, through all)
    with BuildSketch(Plane(origin=(-20, 3, 0), x_dir=(-1, 0, 0), z_dir=(0, 1, 0))):
        with Locations((-60, 60)):
            Circle(MIRROR1_COPY_1_SKETCH_R)
    extrude(amount=-MIRROR1_COPY_1_DEPTH, mode=Mode.SUBTRACT)

    # Mirror1 copy 2 sketch → Mirror1 copy 2 (cut, through all)
    with BuildSketch(Plane(origin=(0, 3, -40), x_dir=(-1, 0, 0), z_dir=(0, 1, 0))):
        with Locations((-60, 60)):
            Circle(MIRROR1_COPY_2_SKETCH_R)
    extrude(amount=-MIRROR1_COPY_2_DEPTH, mode=Mode.SUBTRACT)

    # Mirror1 copy 3 sketch → Mirror1 copy 3 (cut, through all)
    with BuildSketch(Plane(origin=(-20, 3, -40), x_dir=(-1, 0, 0), z_dir=(0, 1, 0))):
        with Locations((-60, 60)):
            Circle(MIRROR1_COPY_3_SKETCH_R)
    extrude(amount=-MIRROR1_COPY_3_DEPTH, mode=Mode.SUBTRACT)

    # Fillet2
    fillet2_edges = [part.edges().sort_by_distance(p)[0] for p in [
        (100, 3, 90),
        (-100, 0, 90),
        (-100, 3, 90),
        (-70, 3, 40),
        (-70, 0, 40),
        (-85, 3, 0),
        (-85, 0, 0),
        (-85, 3, 80),
        (-85, 0, 80),
        (0, 0, -100),
        (0, 3, -100),
        (-100, 0, -27.5),
        (-86.819805153, 0, -86.819805153),
        (86.819805153, 0, -86.819805153),
        (-100, 3, -27.5),
        (-86.819805153, 3, -86.819805153),
        (86.819805153, 3, -86.819805153),
        (100, 0, 90),
        (0, 0, 100),
        (0, 3, 100),
        (100, 0, -27.5),
        (100, 3, -27.5),
        (70, 3, 40),
        (85, 3, 80),
        (85, 3, 0),
        (70, 0, 40),
        (85, 0, 0),
        (85, 0, 80),
    ]]
    fillet(fillet2_edges, radius=FILLET2_R)

    # Sketch23 → Cut-Extrude13 (cut)
    with BuildSketch(Plane(origin=(0, 3, 0), x_dir=(1, 0, 0), z_dir=(0, 1, 0))):
        with Locations((3.779632889, 35)):
            Rectangle(SKETCH23_W, SKETCH23_H)
    extrude(amount=-CUT_EXTRUDE13_DEPTH, mode=Mode.SUBTRACT)

    # Sketch25 → Cut-Extrude15 (cut)
    with BuildSketch(Plane(origin=(0, 3, 0), x_dir=(1, 0, 0), z_dir=(0, 1, 0))):
        with Locations((3.779632889, 86.5)):
            Rectangle(SKETCH25_W, SKETCH25_H)
    extrude(amount=-CUT_EXTRUDE15_DEPTH, mode=Mode.SUBTRACT)

    # Sketch26 → Boss-Extrude3 (add)
    with BuildSketch(Plane(origin=(0, 3, 0), x_dir=(1, 0, 0), z_dir=(0, 1, 0))):
        with Locations((0, -22)):
            Rectangle(SKETCH26_W, SKETCH26_H)
    extrude(amount=BOSS_EXTRUDE3_DEPTH)

    # Sketch27 → Cut-Extrude16 (cut)
    with BuildSketch(Plane(origin=(0, 3, 0), x_dir=(1, 0, 0), z_dir=(0, 1, 0))):
        with Locations((-44.720367111, 46)):
            Rectangle(SKETCH27_W, SKETCH27_H)
    extrude(amount=-CUT_EXTRUDE16_DEPTH, mode=Mode.SUBTRACT)

    # Sketch30 → Cut-Extrude17 (cut)
    with BuildSketch(Plane(origin=(0, 3, 0), x_dir=(1, 0, 0), z_dir=(0, 1, 0))):
        with Locations((-31.5, -89)):
            Circle(SKETCH30_R)
        with Locations((31.5, -89)):
            Circle(SKETCH30_R)
    extrude(amount=-CUT_EXTRUDE17_DEPTH, mode=Mode.SUBTRACT)

    # Sketch31 → Cut-Extrude18 (cut)
    with BuildSketch(Plane(origin=(0, 3, 0), x_dir=(1, 0, 0), z_dir=(0, 1, 0))):
        with Locations((46, -89)):
            Circle(SKETCH31_R)
    extrude(amount=-CUT_EXTRUDE18_DEPTH, mode=Mode.SUBTRACT)


solid = part.part
